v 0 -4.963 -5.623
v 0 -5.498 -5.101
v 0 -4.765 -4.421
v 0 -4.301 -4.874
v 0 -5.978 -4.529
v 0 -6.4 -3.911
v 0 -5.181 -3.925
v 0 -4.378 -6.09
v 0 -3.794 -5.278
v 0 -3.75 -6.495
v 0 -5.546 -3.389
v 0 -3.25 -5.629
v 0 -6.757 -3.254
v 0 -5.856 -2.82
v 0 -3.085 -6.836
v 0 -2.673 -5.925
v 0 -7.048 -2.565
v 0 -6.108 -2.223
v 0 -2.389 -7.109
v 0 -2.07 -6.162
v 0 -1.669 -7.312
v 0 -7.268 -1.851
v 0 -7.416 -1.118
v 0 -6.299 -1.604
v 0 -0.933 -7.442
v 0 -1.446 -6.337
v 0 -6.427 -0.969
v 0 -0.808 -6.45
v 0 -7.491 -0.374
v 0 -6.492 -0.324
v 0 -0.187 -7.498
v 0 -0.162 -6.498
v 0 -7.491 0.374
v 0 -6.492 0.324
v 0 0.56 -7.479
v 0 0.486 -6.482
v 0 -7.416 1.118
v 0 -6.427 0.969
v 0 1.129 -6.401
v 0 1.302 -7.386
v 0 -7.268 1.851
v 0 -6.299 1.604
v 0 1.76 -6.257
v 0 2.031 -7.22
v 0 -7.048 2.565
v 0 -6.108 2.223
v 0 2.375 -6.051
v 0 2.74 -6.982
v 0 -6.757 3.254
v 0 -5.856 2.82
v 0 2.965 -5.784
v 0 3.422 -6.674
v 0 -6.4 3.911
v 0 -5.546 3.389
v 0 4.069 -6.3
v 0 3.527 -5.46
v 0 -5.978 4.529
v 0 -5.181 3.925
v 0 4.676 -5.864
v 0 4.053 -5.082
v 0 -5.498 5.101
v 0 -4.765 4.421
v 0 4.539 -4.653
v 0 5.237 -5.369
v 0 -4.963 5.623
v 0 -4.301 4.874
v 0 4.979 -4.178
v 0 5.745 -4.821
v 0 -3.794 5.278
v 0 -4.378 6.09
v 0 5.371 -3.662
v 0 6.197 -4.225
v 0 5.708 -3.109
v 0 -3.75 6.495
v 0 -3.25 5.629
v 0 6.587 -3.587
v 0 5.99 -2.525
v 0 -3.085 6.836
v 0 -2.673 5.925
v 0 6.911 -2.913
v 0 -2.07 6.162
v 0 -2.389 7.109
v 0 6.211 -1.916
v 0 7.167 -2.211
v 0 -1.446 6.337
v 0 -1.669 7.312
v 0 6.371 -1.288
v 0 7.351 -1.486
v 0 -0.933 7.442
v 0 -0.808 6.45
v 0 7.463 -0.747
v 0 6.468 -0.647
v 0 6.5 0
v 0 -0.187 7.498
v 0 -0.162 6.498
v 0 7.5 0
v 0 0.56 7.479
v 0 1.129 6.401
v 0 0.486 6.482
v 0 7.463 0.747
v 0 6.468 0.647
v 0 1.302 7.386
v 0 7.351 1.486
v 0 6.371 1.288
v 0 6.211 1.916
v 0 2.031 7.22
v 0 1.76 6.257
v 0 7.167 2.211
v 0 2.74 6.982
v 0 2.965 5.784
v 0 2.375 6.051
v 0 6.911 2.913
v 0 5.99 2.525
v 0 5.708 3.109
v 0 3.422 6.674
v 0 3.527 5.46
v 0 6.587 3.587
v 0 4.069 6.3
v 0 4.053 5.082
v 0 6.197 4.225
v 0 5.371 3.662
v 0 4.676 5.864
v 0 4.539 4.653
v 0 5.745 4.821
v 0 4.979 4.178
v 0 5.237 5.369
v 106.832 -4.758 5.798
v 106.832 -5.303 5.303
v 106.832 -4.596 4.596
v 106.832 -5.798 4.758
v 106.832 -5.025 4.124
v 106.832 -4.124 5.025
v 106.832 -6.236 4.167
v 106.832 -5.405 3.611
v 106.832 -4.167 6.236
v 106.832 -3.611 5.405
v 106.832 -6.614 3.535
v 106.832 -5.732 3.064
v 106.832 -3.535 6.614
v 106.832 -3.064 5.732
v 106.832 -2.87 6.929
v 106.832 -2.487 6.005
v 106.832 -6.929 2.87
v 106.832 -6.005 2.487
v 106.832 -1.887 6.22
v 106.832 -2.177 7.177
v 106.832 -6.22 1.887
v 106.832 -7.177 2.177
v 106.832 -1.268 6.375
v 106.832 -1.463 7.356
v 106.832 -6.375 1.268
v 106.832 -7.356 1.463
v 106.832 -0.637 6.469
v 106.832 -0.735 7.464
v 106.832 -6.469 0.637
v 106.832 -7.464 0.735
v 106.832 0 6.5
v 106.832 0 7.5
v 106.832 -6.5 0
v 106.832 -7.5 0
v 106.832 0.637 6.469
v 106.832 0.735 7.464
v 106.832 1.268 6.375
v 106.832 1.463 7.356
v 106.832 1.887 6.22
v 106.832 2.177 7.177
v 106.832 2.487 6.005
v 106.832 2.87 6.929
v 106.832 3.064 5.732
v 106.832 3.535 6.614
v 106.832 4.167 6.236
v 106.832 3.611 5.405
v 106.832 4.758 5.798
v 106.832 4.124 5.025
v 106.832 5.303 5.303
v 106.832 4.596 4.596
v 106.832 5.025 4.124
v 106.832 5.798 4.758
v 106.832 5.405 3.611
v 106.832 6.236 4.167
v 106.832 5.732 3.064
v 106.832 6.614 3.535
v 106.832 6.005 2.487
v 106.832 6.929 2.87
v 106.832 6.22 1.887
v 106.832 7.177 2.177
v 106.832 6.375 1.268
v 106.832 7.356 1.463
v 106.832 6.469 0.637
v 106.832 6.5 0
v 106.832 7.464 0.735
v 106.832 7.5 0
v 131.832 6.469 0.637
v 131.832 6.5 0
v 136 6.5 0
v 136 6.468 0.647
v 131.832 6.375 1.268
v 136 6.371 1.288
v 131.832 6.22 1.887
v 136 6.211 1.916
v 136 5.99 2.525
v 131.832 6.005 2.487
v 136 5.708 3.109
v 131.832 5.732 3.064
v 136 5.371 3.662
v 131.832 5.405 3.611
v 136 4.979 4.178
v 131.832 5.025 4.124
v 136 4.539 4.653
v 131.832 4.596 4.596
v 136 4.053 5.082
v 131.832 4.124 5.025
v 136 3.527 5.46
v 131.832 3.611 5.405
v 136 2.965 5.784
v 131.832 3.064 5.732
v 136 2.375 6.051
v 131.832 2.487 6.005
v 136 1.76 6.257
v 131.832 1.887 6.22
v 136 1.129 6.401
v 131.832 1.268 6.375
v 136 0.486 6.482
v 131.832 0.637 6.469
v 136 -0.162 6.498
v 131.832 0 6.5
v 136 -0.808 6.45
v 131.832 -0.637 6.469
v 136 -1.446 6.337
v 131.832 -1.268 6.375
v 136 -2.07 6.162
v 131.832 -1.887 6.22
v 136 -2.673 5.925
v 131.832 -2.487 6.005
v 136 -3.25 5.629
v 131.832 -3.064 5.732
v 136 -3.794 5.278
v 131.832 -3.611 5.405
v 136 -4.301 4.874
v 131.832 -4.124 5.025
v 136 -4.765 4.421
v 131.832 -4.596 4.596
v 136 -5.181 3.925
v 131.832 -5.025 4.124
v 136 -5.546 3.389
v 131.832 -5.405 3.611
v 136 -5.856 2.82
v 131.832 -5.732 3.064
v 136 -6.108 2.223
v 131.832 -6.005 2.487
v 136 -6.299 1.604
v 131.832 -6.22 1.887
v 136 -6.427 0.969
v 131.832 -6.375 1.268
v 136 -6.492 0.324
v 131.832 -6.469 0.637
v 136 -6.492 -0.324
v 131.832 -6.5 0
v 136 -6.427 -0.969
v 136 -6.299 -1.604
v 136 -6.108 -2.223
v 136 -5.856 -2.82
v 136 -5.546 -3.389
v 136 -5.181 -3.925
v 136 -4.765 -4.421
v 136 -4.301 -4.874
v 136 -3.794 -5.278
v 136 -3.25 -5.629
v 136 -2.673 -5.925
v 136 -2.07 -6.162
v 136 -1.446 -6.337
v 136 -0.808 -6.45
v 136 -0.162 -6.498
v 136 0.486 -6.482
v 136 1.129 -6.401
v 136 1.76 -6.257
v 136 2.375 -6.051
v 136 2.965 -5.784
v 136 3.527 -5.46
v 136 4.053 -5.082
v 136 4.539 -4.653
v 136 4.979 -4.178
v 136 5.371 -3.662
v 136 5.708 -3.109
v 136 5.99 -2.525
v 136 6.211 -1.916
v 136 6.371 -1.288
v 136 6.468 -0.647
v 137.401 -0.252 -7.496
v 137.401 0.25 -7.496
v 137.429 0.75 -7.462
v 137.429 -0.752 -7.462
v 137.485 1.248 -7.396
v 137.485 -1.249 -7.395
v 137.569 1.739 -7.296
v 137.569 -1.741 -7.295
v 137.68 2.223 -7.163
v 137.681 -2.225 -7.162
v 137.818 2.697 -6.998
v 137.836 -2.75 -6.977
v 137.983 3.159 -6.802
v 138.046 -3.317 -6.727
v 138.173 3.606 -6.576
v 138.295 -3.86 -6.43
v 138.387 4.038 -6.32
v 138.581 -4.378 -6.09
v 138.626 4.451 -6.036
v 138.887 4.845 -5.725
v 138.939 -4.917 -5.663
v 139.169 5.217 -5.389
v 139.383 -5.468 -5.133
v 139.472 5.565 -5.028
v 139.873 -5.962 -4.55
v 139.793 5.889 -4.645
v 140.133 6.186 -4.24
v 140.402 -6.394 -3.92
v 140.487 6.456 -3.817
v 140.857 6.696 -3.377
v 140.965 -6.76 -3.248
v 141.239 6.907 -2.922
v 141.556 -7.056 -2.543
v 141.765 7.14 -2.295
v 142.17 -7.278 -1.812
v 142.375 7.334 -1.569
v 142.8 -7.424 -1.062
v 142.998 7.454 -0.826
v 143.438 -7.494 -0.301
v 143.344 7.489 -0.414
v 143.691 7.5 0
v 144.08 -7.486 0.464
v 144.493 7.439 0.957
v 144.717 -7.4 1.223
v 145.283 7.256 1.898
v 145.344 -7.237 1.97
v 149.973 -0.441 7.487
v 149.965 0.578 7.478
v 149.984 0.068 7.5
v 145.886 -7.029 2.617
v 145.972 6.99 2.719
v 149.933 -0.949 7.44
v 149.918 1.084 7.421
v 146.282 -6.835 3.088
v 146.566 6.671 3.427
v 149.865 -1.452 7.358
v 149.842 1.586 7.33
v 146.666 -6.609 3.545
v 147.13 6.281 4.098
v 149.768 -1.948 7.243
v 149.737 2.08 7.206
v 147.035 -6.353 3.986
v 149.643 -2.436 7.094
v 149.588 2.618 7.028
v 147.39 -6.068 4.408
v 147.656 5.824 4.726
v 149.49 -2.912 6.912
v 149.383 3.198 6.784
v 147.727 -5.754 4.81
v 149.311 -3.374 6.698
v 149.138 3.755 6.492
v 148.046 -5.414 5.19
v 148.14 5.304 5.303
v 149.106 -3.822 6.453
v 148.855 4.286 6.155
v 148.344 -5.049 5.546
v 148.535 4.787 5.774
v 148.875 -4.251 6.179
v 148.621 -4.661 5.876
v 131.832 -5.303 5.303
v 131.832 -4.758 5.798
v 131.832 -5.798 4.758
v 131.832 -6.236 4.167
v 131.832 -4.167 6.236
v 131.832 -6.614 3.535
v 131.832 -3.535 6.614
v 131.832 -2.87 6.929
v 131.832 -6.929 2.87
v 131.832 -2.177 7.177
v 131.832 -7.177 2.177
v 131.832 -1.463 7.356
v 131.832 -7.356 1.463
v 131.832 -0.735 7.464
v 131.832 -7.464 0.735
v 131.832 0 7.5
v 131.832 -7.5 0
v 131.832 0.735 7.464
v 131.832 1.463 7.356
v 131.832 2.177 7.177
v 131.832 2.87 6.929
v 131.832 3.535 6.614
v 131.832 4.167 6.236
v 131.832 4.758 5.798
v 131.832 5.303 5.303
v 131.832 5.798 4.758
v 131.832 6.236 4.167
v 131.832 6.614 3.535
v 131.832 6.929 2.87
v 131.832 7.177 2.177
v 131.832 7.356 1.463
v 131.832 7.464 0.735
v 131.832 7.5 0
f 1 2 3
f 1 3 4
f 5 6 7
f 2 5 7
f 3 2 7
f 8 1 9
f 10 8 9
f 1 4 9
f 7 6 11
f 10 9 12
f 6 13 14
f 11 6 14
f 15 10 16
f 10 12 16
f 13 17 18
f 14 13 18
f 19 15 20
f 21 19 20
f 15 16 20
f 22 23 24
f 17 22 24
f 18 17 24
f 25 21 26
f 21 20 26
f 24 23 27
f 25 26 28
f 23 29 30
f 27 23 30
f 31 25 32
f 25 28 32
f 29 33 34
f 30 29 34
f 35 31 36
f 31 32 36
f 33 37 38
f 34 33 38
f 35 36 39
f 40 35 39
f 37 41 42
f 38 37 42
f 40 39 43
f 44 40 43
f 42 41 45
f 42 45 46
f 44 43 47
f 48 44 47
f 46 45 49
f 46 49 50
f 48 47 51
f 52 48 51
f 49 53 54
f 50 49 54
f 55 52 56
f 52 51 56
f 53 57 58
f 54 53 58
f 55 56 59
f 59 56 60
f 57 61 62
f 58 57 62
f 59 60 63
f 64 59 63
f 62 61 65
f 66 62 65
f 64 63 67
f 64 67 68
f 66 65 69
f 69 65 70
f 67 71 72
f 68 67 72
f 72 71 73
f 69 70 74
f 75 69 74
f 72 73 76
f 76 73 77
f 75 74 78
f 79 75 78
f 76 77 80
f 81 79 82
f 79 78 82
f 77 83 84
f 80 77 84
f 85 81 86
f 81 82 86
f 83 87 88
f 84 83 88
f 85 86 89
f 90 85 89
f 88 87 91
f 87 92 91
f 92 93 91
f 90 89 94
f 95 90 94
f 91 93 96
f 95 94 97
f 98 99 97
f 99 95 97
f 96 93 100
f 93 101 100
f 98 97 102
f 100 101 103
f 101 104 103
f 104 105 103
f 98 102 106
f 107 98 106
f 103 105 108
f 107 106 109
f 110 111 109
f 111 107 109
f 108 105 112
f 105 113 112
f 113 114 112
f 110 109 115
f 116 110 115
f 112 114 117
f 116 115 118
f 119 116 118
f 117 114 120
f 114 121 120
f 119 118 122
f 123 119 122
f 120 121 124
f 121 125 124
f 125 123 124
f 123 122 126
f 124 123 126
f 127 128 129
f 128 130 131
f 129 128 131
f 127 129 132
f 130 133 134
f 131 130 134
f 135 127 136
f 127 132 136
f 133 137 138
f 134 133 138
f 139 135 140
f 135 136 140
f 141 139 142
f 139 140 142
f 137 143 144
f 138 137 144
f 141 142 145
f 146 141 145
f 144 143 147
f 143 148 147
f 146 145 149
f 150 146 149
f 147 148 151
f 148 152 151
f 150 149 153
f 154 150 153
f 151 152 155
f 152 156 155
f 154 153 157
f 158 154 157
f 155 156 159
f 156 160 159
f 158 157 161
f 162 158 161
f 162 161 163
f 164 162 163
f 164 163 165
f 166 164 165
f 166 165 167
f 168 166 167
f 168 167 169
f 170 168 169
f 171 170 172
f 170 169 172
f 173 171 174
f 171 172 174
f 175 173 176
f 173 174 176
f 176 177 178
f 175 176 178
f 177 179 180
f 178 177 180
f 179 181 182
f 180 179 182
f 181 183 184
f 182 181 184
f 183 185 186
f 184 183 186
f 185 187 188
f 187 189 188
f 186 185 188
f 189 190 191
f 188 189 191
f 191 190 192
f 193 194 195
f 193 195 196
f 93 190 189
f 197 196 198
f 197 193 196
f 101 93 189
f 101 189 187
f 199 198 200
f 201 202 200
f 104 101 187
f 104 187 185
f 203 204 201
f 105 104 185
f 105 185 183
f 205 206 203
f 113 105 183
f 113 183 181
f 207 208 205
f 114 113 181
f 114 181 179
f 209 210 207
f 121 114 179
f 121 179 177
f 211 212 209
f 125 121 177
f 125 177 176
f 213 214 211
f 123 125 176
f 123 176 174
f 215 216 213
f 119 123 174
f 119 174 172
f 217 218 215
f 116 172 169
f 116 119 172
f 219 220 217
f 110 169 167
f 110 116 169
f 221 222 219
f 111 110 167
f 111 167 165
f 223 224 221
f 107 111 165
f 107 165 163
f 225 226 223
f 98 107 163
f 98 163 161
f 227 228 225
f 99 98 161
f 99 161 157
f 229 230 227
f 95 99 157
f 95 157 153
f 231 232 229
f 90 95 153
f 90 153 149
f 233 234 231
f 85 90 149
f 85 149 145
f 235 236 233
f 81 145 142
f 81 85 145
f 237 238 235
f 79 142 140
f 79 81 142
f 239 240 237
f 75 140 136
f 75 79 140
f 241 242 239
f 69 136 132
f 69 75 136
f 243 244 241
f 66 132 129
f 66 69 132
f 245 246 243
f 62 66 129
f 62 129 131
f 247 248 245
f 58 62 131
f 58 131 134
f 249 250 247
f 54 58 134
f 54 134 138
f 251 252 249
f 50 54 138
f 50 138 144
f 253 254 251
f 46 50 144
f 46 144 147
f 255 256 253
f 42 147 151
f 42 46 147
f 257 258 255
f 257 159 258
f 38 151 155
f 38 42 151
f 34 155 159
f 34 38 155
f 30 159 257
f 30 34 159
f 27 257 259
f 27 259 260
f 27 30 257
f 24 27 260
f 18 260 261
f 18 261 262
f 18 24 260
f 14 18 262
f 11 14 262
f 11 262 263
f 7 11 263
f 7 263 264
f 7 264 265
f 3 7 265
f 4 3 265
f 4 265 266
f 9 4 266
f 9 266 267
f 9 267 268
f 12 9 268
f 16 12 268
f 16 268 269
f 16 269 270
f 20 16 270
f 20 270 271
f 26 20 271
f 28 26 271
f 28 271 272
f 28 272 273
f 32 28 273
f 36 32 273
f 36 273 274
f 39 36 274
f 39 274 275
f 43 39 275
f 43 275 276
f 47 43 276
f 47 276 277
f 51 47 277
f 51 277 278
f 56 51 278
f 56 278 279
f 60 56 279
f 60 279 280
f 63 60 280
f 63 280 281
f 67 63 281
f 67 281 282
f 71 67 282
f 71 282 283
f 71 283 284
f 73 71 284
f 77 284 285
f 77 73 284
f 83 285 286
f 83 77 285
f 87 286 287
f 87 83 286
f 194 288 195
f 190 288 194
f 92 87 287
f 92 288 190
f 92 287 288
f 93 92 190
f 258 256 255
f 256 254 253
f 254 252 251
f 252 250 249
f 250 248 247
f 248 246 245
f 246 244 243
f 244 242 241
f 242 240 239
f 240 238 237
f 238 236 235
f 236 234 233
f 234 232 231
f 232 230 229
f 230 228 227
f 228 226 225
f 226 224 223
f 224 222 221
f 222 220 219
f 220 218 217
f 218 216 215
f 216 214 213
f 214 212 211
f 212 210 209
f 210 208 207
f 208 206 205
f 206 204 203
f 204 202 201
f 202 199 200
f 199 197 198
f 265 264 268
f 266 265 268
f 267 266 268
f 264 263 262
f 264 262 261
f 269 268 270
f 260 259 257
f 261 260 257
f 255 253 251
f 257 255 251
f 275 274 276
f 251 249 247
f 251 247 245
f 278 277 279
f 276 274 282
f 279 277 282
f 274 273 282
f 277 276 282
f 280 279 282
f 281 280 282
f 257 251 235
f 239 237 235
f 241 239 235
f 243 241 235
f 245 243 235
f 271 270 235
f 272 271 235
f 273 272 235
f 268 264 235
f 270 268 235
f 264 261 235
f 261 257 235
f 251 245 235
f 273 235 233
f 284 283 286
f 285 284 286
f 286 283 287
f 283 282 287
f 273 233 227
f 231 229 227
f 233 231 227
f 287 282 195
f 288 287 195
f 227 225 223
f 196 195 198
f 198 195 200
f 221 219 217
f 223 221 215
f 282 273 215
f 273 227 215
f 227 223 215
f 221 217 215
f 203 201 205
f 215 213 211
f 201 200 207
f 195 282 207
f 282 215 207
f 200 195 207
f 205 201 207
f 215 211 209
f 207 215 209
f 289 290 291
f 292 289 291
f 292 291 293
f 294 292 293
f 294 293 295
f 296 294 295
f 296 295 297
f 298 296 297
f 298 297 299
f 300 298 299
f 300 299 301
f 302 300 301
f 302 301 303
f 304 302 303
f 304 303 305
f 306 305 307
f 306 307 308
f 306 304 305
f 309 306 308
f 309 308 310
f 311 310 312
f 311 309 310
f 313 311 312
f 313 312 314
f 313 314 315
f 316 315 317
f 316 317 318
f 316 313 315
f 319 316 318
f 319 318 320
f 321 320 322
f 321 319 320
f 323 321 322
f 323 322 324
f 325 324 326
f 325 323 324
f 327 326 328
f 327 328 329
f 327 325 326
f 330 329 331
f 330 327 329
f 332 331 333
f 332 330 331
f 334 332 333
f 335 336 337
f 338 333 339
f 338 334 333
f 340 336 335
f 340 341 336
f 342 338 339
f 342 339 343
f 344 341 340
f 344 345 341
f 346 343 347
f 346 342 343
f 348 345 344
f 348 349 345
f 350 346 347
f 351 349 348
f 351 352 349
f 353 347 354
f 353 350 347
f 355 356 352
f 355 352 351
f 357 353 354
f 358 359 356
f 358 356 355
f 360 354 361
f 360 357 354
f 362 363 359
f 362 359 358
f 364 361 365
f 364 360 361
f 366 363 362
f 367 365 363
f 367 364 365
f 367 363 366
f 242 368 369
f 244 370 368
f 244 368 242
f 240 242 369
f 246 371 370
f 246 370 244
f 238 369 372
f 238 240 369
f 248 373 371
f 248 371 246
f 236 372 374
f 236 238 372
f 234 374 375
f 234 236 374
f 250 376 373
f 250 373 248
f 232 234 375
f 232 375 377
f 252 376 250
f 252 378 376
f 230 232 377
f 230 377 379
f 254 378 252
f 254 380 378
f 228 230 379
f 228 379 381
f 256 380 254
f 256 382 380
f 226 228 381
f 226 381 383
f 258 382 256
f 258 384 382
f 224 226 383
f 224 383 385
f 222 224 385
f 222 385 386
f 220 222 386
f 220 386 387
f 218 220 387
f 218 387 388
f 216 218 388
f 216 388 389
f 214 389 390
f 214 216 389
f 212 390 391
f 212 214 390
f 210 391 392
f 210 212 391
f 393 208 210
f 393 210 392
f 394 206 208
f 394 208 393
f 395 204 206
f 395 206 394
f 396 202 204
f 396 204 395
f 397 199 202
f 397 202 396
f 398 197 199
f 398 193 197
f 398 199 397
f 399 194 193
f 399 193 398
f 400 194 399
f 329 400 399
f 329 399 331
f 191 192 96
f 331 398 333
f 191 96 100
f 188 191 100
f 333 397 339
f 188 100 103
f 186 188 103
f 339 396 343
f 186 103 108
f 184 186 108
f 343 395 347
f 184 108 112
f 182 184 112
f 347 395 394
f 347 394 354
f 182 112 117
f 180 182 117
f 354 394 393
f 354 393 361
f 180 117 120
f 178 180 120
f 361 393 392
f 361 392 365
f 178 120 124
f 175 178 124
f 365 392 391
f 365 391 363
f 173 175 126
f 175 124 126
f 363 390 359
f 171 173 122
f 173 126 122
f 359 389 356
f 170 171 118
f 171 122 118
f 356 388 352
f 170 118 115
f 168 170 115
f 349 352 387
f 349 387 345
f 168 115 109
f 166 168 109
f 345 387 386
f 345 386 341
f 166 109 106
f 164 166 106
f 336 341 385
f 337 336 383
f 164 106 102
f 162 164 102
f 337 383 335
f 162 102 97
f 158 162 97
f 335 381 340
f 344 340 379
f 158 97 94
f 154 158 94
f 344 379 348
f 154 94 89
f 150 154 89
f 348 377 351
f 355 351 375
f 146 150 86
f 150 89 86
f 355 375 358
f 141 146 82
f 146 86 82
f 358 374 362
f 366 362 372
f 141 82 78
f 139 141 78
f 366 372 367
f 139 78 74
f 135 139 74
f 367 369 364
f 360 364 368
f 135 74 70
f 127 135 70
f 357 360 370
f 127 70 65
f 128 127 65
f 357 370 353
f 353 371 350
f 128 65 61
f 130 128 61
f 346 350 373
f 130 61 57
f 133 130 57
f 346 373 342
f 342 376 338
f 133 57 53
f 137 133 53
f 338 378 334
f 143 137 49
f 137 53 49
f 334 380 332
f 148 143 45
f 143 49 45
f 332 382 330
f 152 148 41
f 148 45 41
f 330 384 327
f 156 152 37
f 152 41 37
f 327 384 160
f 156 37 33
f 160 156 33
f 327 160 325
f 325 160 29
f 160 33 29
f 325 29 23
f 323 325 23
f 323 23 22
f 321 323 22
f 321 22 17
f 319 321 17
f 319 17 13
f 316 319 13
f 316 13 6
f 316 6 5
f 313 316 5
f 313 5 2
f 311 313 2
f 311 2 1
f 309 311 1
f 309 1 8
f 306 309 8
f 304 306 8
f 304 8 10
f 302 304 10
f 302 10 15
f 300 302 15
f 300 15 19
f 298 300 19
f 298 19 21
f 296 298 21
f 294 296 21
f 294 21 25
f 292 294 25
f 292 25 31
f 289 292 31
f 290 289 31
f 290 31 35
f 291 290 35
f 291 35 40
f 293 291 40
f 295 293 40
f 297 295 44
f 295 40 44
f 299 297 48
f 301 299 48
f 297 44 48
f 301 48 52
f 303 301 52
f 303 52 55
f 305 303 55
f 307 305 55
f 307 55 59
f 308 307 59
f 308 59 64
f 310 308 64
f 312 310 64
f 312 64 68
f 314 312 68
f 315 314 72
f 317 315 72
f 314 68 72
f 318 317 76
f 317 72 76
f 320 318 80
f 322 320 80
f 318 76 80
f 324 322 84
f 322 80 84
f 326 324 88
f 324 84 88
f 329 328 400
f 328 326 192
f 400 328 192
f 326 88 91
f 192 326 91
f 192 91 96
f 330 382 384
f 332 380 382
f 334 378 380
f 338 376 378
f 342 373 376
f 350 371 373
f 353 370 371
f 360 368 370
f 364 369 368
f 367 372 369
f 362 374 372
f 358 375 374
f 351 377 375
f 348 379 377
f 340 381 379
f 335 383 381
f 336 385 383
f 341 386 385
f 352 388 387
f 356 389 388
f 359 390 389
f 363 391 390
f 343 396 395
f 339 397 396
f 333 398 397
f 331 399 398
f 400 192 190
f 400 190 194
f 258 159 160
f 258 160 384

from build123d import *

# Parameters (mm, degrees)
F0_R     = 7.5
F1_DEPTH = 150
F3_DEPTH = 12.5
F4_W     = 25
F4_H     = 20
F5_DEPTH = 36
F6_R     = 6.5
F7_DEPTH = 136


with BuildPart() as f1:
    # F0 (on Right) → F1 (new body)
    with BuildSketch(Plane.YZ):
        Circle(F0_R)
    extrude(amount=F1_DEPTH)

    # F2 (on Front) → F3 (intersect, symmetric)
    with BuildSketch(Plane.XZ):
        Polygon((134.290012, -11.203319), (151.53335, 9.346492), (-5.394438, 11.139952), (-5.394438, -11.203319), align=None)
    extrude(amount=F3_DEPTH, both=True, mode=Mode.INTERSECT)

    # F4 (on Top) → F5 (cut)
    with BuildSketch(Plane.XY):
        with Locations((119.331561, 0.248567)):
            Rectangle(F4_W, F4_H)
    extrude(amount=F5_DEPTH, mode=Mode.SUBTRACT)

    # F6 (on Right) → F7 (cut)
    with BuildSketch(Plane.YZ):
        Circle(F6_R)
    extrude(amount=F7_DEPTH, mode=Mode.SUBTRACT)


solid = f1.part
